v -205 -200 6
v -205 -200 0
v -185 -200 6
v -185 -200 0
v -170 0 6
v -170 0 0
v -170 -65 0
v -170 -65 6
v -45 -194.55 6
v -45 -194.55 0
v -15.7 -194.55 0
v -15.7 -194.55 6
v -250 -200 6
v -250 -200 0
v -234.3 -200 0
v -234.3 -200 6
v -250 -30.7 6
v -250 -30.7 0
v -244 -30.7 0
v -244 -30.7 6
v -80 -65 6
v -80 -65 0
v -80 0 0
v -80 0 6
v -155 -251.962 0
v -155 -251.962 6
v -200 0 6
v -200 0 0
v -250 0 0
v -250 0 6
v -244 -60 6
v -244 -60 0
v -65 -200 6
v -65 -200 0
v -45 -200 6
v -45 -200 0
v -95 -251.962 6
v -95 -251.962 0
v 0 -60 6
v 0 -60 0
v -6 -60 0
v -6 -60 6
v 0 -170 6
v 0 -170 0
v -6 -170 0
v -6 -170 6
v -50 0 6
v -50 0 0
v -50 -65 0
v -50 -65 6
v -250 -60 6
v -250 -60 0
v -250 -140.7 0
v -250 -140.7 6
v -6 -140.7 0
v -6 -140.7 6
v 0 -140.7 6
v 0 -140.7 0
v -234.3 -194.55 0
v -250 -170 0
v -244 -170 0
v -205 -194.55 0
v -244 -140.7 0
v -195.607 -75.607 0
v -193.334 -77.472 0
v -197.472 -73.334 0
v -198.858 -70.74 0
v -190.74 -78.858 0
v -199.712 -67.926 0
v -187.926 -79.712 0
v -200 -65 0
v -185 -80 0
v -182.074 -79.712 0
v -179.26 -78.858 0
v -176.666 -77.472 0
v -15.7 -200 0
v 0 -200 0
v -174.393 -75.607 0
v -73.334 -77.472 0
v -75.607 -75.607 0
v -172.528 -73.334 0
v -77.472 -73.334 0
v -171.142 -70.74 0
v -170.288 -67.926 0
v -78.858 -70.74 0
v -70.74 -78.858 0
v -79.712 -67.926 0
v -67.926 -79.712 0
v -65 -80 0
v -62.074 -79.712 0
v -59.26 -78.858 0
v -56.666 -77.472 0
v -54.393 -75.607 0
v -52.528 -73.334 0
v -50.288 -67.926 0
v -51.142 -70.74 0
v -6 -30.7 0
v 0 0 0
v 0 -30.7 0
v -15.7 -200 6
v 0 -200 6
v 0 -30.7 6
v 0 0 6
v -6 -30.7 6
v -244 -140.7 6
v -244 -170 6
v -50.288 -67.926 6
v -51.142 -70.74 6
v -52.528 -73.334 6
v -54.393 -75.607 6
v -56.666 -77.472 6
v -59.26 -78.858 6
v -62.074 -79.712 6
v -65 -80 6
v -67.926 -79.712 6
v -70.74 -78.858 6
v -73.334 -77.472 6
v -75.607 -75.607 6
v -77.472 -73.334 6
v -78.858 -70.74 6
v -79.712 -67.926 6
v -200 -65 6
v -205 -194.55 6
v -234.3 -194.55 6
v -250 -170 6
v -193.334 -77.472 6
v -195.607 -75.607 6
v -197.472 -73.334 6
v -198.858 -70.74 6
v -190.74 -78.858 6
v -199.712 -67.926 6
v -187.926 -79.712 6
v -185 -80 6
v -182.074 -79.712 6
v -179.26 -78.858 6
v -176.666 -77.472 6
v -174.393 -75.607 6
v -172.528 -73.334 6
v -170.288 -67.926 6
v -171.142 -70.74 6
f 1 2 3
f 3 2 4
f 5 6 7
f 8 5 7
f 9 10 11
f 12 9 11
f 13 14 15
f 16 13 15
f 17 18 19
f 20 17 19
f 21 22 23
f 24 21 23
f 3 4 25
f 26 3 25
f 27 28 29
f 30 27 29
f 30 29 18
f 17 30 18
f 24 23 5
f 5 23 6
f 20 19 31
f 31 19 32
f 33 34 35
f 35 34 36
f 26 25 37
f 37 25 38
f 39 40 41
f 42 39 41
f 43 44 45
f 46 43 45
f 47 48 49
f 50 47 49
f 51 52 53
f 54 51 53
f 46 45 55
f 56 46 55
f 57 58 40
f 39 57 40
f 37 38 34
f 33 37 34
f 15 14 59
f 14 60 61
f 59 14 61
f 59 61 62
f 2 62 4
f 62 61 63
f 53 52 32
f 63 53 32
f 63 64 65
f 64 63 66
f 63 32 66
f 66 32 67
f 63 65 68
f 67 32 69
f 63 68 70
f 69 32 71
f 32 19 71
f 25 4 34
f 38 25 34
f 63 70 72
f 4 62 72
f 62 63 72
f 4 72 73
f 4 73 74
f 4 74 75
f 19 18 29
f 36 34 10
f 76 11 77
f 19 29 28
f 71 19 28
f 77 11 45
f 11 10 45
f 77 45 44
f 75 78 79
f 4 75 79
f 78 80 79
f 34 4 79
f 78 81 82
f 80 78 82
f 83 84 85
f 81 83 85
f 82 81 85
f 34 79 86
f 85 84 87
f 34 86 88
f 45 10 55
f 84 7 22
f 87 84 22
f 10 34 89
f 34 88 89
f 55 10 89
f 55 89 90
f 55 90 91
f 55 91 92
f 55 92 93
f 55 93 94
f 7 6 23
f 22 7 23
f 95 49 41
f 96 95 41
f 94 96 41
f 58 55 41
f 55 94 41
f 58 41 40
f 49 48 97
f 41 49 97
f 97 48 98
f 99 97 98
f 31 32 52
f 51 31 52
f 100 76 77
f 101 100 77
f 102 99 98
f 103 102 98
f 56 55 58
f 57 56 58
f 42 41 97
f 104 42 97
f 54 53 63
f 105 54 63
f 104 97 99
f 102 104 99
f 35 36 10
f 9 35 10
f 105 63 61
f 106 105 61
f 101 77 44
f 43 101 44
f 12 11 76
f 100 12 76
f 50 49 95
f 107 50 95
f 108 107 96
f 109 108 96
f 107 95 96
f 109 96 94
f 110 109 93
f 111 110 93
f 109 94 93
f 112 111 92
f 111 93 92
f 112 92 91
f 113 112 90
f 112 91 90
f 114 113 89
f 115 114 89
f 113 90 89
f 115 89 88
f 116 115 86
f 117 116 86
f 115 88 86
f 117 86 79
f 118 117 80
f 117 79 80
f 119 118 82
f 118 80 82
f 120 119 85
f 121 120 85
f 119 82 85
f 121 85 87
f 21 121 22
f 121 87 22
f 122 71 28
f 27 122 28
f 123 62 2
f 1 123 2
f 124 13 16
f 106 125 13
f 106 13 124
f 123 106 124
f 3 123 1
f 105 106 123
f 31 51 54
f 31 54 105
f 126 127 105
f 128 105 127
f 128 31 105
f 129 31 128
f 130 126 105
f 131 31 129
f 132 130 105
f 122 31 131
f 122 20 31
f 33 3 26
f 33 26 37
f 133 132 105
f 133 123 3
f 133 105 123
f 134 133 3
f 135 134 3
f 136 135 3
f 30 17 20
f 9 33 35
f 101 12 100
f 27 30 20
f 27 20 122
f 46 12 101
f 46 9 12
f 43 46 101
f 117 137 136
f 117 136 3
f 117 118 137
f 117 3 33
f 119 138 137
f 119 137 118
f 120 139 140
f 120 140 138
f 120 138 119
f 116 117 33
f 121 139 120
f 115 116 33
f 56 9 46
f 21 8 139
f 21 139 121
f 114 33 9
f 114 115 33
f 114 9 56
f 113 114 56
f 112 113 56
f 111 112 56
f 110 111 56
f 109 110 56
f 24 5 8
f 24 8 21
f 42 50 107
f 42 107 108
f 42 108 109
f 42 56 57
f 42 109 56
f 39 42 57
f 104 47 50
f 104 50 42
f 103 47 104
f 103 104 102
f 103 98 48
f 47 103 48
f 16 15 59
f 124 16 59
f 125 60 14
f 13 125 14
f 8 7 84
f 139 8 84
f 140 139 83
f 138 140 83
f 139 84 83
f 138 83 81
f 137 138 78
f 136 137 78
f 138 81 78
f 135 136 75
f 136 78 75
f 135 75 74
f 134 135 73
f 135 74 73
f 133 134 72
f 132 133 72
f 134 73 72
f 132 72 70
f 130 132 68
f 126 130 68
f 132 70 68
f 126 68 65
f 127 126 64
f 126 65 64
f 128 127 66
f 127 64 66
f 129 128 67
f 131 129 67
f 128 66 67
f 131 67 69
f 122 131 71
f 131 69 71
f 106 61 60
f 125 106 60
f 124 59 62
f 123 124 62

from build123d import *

# Parameters (mm, degrees)
EXTRUDE_1_DEPTH = 6


with BuildPart() as part:
    # Эскиз1 → Бобышка-Вытянуть1 (new body)
    with BuildSketch(Plane.XY):
        with BuildLine():
            Line((0, 0), (-50, 0))
            Line((-50, 0), (-50, -65))
            ThreePointArc((-50, -65), (-65, -80), (-80, -65))
            Line((-80, -65), (-80, 0))
            Line((-80, 0), (-170, 0))
            Line((-170, 0), (-170, -65))
            ThreePointArc((-170, -65), (-185, -80), (-200, -65))
            Line((-200, -65), (-200, 0))
            Line((-200, 0), (-250, 0))
            Line((-250, 0), (-250, -30.7))
            Line((-250, -30.7), (-244, -30.7))
            Line((-244, -30.7), (-244, -60))
            Line((-244, -60), (-250, -60))
            Line((-250, -60), (-250, -140.7))
            Line((-250, -140.7), (-244, -140.7))
            Line((-244, -140.7), (-244, -170))
            Line((-244, -170), (-250, -170))
            Line((-250, -170), (-250, -200))
            Line((-250, -200), (-234.3, -200))
            Line((-234.3, -200), (-234.3, -194.55))
            Line((-234.3, -194.55), (-205, -194.55))
            Line((-205, -194.55), (-205, -200))
            Line((-205, -200), (-185, -200))
            Line((-185, -200), (-155, -251.961524227))
            Line((-155, -251.961524227), (-95, -251.961524227))
            Line((-95, -251.961524227), (-65, -200))
            Line((-65, -200), (-45, -200))
            Line((-45, -200), (-45, -194.55))
            Line((-45, -194.55), (-15.7, -194.55))
            Line((-15.7, -194.55), (-15.7, -200))
            Line((-15.7, -200), (0, -200))
            Line((0, -200), (0, -170))
            Line((0, -170), (-6, -170))
            Line((-6, -170), (-6, -140.7))
            Line((-6, -140.7), (0, -140.7))
            Line((0, -140.7), (0, -60))
            Line((0, -60), (-6, -60))
            Line((-6, -60), (-6, -30.7))
            Line((-6, -30.7), (0, -30.7))
            Line((0, -30.7), (0, 0))
        make_face()
    extrude(amount=EXTRUDE_1_DEPTH)


solid = part.part
